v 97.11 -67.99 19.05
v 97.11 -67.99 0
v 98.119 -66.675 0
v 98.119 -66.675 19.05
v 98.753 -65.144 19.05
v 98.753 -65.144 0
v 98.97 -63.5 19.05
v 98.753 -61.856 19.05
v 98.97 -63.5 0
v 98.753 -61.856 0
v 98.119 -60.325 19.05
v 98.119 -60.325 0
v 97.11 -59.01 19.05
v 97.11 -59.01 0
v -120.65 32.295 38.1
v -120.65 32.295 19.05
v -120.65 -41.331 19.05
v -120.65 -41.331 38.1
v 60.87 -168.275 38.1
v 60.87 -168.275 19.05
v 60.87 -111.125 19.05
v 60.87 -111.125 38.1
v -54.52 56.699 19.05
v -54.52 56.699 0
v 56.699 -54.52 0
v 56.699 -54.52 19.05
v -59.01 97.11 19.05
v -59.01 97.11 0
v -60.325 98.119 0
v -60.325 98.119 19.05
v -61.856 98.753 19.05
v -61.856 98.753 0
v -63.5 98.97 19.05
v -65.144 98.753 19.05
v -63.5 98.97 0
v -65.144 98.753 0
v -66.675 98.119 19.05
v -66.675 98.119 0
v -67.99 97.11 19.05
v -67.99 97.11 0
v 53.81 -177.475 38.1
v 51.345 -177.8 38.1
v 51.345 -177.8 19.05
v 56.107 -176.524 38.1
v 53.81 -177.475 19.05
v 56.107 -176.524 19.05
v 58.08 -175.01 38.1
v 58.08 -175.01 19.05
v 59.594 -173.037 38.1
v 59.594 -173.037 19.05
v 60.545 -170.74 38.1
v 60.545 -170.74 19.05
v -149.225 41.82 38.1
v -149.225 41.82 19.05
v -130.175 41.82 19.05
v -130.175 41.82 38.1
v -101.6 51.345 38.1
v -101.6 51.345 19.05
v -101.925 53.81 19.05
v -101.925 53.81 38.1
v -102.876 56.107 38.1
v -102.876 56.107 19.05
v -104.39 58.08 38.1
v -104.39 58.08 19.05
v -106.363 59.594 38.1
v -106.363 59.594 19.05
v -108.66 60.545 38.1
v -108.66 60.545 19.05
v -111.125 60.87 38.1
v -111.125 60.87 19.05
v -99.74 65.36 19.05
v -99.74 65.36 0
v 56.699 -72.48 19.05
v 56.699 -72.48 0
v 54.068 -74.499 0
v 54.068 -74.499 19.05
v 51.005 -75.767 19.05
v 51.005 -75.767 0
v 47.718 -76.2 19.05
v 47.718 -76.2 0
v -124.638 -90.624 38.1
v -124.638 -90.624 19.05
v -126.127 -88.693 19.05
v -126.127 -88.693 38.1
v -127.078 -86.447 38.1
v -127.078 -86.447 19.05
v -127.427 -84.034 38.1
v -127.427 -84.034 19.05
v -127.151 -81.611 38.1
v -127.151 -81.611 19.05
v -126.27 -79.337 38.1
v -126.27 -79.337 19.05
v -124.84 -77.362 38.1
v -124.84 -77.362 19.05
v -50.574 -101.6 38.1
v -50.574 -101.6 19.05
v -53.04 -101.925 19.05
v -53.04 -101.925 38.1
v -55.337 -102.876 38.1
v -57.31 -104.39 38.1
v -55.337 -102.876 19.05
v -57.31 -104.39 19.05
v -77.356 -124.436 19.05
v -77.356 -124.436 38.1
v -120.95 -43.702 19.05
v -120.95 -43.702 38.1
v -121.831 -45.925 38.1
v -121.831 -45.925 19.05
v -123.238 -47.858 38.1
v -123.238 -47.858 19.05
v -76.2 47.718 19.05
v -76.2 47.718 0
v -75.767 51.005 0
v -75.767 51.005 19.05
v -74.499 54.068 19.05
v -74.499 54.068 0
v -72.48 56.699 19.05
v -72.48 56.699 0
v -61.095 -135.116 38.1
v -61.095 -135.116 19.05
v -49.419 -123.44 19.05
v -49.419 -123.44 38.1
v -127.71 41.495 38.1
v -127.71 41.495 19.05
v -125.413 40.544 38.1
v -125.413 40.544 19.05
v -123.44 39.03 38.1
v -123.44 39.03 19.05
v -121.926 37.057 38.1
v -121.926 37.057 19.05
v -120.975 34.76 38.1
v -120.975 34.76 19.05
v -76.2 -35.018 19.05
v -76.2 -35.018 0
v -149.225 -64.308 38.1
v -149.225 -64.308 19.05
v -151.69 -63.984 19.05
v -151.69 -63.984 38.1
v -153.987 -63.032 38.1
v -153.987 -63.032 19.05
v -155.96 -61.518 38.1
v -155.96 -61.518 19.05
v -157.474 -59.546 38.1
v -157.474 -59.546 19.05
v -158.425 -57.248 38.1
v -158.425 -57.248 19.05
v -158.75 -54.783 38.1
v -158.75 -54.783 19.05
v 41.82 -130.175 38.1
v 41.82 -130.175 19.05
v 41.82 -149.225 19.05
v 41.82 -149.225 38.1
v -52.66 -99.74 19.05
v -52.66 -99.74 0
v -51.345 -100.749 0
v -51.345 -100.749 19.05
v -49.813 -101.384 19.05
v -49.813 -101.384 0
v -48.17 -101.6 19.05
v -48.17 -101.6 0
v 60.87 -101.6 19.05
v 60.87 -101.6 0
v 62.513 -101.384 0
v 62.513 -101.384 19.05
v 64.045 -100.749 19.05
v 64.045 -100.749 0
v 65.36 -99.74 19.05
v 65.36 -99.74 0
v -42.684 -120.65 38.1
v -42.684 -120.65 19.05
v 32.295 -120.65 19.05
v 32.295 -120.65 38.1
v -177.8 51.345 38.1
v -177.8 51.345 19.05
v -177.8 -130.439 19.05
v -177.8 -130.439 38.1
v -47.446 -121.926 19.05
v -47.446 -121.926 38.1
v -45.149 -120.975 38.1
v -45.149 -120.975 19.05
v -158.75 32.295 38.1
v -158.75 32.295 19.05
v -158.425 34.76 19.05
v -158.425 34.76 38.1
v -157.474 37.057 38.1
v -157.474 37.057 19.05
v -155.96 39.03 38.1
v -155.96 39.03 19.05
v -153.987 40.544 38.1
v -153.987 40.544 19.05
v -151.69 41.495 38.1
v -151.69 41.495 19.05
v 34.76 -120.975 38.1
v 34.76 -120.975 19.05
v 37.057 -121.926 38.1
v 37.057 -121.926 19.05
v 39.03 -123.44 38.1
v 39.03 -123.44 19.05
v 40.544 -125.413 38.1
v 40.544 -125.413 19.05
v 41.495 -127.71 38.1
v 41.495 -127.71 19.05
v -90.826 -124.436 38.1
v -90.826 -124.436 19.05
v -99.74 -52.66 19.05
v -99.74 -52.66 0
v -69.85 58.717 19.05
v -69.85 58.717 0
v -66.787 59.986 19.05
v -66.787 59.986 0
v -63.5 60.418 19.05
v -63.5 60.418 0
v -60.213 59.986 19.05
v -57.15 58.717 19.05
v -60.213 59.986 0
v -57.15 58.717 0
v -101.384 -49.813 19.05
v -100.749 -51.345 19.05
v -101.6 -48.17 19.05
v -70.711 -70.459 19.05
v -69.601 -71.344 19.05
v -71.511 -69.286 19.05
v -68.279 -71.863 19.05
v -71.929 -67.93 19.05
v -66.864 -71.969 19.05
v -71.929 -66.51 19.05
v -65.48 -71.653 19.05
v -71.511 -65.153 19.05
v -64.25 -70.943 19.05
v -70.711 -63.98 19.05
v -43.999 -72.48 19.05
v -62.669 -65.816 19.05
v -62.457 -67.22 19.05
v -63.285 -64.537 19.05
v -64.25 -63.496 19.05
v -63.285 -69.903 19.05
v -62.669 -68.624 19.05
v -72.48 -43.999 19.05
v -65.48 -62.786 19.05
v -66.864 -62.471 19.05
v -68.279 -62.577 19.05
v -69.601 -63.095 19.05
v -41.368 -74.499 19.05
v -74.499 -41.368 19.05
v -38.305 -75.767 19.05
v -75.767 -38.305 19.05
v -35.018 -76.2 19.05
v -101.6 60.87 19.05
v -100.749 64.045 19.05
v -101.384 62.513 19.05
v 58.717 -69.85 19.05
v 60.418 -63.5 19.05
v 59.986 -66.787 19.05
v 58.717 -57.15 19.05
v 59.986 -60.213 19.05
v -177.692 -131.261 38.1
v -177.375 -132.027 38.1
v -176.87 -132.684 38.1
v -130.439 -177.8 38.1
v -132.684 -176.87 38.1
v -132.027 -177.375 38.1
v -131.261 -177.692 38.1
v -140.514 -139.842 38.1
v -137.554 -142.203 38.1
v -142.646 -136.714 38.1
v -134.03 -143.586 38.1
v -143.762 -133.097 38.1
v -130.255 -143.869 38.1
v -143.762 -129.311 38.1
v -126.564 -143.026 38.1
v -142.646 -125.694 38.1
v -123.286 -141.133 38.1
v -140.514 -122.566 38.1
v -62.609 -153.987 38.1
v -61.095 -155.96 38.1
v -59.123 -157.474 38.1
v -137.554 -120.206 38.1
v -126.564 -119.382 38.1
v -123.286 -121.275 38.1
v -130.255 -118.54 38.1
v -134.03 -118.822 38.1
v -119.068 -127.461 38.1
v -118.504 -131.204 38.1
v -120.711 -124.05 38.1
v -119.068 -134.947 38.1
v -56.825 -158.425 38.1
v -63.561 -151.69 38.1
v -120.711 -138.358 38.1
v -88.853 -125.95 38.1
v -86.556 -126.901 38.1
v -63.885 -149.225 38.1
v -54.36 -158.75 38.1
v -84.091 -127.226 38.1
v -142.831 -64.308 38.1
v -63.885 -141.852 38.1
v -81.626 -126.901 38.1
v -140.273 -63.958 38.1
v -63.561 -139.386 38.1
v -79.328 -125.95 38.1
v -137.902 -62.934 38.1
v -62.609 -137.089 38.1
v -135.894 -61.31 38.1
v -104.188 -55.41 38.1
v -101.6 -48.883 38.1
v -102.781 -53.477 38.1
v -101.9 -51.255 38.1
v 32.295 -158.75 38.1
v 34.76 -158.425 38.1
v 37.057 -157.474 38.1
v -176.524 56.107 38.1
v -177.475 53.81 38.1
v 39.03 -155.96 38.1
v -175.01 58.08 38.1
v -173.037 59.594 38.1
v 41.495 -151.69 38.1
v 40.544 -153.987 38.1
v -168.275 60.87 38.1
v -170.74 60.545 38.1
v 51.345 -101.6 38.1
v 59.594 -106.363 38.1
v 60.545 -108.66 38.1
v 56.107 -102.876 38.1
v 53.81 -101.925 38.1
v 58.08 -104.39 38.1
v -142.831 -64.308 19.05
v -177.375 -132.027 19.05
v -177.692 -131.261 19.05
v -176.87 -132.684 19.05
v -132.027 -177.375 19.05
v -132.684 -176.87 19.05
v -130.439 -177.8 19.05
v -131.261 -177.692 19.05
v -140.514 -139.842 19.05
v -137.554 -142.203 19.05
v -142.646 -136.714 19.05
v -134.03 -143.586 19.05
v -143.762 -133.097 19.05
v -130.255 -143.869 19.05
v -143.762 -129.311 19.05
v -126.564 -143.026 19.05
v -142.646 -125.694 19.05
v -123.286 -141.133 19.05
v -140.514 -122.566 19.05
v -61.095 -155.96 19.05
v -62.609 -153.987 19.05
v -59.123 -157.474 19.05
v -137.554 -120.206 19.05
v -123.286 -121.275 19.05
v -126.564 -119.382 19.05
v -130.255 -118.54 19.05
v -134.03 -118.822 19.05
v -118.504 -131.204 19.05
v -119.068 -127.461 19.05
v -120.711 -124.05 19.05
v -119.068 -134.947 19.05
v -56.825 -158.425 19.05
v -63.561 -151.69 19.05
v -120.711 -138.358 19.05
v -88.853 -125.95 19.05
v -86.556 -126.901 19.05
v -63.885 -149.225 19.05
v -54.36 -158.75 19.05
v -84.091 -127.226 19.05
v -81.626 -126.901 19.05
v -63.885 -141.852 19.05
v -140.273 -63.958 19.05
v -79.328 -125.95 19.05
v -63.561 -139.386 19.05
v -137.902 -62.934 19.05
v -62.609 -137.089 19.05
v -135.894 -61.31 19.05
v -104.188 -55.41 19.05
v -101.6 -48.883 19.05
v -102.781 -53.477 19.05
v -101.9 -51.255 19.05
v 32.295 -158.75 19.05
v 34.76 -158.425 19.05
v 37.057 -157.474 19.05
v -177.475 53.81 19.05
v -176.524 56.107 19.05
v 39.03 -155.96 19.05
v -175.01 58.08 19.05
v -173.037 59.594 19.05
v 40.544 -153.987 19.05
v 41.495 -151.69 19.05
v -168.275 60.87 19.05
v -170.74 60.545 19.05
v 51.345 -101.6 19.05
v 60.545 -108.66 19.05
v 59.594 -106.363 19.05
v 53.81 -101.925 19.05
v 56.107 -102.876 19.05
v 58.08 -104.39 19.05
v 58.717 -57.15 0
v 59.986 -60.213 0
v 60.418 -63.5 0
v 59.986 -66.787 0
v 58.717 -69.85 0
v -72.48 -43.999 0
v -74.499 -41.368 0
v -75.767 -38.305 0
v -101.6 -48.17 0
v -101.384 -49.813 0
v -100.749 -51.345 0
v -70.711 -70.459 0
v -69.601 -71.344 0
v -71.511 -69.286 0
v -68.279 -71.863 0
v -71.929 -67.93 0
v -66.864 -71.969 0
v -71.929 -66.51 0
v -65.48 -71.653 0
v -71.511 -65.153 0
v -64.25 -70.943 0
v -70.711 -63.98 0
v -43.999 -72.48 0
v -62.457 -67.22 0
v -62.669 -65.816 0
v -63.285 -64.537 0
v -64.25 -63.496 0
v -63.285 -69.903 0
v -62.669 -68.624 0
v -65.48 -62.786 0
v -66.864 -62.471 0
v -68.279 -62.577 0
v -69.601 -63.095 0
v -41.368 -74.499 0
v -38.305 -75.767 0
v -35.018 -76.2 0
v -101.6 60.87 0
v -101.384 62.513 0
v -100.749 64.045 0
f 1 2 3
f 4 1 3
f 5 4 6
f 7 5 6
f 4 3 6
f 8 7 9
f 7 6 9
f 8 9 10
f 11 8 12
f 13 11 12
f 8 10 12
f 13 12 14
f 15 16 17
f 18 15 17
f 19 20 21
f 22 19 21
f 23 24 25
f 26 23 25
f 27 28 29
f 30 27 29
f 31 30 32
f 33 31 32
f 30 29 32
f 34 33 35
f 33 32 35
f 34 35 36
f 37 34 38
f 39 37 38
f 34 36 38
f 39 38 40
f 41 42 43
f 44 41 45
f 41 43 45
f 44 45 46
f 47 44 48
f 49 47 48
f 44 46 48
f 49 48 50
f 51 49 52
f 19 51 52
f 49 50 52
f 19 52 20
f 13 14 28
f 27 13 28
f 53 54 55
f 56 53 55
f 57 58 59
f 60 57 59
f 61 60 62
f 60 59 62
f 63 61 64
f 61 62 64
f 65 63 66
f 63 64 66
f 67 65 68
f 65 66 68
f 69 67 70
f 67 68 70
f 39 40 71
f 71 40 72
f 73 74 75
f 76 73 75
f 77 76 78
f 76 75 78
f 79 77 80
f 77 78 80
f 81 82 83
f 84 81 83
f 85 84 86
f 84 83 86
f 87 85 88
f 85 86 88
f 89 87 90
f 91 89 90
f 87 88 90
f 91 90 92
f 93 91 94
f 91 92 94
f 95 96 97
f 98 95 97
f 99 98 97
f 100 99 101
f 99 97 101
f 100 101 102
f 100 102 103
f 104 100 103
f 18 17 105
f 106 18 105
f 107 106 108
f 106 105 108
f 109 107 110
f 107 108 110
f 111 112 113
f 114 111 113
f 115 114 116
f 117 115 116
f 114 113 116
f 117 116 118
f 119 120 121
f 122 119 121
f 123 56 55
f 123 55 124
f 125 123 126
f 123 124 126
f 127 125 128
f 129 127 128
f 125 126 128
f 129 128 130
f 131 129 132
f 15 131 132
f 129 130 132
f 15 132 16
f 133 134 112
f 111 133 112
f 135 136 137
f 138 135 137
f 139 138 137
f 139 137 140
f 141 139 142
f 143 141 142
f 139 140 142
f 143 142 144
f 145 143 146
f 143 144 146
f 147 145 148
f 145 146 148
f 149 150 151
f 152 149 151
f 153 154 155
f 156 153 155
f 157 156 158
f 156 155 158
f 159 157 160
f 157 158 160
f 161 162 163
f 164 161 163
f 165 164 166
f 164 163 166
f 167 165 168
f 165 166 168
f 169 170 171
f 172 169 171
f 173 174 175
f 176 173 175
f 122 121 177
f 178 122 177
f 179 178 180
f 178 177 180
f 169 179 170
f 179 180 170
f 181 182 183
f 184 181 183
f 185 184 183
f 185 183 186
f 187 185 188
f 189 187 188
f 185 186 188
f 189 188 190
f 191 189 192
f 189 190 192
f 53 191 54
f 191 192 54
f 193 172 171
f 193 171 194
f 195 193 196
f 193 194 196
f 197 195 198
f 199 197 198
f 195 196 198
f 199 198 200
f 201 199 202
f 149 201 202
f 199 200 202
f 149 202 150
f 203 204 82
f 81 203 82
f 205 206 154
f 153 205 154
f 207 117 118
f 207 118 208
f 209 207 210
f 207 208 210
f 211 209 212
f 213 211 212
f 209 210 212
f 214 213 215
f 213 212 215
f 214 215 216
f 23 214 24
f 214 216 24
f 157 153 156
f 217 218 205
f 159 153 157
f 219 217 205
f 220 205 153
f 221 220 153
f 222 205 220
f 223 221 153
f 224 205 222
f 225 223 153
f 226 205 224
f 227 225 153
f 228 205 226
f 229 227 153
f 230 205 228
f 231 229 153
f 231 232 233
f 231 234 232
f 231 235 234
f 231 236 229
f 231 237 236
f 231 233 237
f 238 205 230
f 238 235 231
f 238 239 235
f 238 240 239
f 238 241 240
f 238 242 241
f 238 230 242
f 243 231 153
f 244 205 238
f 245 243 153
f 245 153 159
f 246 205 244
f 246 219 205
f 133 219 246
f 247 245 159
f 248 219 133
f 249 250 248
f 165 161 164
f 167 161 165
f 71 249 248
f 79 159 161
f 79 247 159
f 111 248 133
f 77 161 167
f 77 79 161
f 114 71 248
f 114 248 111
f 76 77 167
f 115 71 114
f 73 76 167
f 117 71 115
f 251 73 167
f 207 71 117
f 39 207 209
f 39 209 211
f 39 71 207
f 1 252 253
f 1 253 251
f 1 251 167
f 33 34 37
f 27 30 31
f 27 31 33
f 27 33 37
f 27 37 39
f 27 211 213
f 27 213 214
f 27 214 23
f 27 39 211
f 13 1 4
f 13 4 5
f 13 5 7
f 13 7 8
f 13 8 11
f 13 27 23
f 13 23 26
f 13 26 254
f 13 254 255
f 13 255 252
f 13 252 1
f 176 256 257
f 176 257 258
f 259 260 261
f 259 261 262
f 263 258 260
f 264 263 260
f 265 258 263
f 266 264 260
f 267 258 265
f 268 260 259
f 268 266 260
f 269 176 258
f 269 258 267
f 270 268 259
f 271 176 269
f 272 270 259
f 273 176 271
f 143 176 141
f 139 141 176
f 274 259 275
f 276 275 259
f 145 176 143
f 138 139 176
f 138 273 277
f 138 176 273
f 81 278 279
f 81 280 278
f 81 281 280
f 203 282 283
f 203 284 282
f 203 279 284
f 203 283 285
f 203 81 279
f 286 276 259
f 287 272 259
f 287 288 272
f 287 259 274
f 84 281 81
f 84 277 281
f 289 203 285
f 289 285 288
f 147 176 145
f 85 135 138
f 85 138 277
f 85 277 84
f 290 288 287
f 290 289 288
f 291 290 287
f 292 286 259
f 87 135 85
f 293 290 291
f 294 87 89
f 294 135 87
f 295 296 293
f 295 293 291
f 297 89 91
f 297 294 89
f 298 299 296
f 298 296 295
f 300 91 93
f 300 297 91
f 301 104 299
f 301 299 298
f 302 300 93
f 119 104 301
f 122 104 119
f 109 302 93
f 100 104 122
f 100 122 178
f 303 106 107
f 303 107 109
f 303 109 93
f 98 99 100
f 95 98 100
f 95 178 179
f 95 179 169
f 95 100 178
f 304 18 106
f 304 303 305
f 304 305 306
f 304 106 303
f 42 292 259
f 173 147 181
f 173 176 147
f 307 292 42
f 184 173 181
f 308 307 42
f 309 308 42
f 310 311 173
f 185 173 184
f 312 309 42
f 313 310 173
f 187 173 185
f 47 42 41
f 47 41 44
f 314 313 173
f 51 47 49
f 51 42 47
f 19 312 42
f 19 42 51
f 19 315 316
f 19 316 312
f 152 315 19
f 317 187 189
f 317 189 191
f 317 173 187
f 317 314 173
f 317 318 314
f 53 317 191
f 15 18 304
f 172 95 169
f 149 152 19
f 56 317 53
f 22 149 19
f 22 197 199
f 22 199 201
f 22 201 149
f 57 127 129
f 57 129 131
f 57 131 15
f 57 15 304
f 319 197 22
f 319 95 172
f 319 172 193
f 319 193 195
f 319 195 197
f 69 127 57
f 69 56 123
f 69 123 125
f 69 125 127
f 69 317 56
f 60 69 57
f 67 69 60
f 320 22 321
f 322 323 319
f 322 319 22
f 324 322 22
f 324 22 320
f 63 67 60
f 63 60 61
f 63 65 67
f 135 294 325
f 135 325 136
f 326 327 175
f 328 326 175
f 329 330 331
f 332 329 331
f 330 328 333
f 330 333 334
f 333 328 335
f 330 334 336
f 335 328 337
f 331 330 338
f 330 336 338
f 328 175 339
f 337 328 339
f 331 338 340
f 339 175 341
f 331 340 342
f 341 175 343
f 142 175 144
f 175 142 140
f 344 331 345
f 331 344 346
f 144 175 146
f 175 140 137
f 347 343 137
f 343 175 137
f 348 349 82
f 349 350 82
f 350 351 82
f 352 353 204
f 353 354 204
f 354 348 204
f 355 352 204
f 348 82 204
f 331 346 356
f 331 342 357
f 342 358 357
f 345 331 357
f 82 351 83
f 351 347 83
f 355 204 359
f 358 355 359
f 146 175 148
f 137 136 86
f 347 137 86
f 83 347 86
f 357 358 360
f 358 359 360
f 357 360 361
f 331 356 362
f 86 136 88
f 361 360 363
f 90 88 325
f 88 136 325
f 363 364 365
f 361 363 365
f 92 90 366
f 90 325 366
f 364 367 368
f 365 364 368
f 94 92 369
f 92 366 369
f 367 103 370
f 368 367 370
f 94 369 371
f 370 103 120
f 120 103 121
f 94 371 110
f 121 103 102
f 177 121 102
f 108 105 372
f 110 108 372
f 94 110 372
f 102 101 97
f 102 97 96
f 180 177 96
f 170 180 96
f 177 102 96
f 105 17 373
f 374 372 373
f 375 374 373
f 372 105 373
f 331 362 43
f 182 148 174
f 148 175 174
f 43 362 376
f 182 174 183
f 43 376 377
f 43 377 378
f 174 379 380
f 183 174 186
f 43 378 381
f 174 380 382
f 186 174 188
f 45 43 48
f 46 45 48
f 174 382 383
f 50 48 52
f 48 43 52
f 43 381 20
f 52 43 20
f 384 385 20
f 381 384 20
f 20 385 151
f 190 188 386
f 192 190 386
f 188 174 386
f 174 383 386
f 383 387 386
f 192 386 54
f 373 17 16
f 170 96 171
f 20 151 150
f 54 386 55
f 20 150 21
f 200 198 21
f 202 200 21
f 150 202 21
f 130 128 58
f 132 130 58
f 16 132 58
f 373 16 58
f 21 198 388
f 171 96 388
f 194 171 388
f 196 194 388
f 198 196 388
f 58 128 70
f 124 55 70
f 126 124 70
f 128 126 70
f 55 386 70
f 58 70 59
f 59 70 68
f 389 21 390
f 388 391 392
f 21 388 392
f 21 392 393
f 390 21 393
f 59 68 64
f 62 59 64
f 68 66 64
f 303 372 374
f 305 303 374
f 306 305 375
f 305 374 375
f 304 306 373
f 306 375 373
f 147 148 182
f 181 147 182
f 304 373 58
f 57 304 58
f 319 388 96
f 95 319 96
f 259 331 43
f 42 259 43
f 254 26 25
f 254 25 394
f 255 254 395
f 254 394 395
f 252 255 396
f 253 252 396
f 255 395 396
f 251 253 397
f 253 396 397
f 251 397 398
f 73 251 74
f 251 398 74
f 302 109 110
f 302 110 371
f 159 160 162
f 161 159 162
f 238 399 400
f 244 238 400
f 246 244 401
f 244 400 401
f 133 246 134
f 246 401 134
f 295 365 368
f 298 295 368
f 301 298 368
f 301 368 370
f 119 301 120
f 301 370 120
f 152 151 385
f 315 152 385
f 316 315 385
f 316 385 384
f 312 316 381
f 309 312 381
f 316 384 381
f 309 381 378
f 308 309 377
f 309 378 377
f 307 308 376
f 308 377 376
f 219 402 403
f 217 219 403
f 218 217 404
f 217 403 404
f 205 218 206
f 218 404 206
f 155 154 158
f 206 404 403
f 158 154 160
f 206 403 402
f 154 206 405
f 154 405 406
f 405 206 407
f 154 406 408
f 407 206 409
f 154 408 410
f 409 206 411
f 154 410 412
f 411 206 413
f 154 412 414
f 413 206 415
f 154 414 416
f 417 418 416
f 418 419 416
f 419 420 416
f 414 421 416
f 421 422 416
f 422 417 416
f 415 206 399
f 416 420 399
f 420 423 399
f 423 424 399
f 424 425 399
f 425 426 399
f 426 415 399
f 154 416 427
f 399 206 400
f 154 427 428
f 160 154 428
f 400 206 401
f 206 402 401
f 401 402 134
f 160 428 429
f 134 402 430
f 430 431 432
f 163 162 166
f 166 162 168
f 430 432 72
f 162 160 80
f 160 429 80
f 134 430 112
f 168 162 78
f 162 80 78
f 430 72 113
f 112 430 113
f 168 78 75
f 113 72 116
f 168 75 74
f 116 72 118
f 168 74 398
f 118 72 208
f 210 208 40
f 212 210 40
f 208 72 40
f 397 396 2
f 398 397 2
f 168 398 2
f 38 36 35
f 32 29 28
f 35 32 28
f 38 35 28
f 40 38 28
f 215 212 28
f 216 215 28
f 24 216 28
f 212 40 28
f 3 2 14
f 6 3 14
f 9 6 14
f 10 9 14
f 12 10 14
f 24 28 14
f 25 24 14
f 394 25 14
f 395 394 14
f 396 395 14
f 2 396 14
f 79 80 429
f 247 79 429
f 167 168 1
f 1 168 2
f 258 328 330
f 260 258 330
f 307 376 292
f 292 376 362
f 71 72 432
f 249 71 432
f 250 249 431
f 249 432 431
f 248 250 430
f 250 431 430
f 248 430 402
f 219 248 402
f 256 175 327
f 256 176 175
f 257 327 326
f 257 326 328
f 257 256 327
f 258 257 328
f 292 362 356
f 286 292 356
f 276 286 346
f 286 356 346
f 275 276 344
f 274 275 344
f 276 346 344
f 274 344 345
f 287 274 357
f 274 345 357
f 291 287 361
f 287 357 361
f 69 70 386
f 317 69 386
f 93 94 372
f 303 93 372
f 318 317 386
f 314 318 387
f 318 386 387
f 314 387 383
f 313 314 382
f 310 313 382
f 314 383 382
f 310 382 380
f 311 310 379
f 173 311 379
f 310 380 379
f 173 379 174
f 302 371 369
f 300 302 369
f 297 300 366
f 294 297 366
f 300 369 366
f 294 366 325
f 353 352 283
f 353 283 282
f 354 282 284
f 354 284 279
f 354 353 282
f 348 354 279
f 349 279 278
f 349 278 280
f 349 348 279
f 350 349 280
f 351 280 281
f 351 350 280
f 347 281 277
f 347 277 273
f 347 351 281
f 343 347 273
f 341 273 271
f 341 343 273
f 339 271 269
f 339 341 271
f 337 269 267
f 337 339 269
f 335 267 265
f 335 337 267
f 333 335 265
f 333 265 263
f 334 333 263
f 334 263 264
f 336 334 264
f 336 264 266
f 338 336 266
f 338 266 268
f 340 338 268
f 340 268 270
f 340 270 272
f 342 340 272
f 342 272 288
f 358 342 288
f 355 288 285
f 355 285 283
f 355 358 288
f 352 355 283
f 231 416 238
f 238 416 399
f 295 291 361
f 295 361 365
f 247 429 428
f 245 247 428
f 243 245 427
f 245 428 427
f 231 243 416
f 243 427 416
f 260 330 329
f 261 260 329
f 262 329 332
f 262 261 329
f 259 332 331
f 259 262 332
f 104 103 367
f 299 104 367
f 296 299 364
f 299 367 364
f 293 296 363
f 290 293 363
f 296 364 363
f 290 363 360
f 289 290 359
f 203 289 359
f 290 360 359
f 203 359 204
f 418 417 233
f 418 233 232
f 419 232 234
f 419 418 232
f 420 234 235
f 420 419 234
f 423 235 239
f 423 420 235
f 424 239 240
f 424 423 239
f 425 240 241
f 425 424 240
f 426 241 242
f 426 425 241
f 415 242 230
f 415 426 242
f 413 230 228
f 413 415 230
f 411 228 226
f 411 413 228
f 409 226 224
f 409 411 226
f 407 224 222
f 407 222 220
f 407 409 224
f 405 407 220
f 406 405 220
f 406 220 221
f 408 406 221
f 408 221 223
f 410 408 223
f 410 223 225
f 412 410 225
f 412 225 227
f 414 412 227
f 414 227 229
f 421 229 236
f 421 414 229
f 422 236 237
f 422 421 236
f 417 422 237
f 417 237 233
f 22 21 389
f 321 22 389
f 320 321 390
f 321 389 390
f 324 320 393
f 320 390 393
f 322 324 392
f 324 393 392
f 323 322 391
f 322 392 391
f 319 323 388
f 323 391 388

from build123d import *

# Parameters (mm, degrees)
F0_R     = 4.7625
F1_DEPTH = 19.05
F2_R     = 12.7
F3_DEPTH = 19.05
F4_R     = 3.175


with BuildPart() as f1:
    # F0 (on Top) → F1 (new body)
    with BuildSketch(Plane.XY):
        with BuildLine():
            ThreePointArc((-52.659872, -99.740128), (-50.599784, -101.116635), (-48.169744, -101.6))
            Line((-48.169744, -101.6), (60.869744, -101.6))
            ThreePointArc((60.869744, -101.6), (63.299784, -101.116635), (65.359872, -99.740128))
            Line((65.359872, -99.740128), (97.109872, -67.990128))
            ThreePointArc((97.109872, -67.990128), (98.969744, -63.5), (97.109872, -59.009872))
            Line((97.109872, -59.009872), (-59.009872, 97.109872))
            ThreePointArc((-59.009872, 97.109872), (-63.5, 98.969744), (-67.990128, 97.109872))
            Line((-67.990128, 97.109872), (-99.740128, 65.359872))
            ThreePointArc((-99.740128, 65.359872), (-101.116635, 63.299784), (-101.6, 60.869744))
            Line((-101.6, 60.869744), (-101.6, -48.169744))
            ThreePointArc((-101.6, -48.169744), (-101.116635, -50.599784), (-99.740128, -52.659872))
            Line((-99.740128, -52.659872), (-52.659872, -99.740128))
        make_face()
        with Locations((-67.219744, -67.219744)):
            Circle(F0_R, mode=Mode.SUBTRACT)
        with BuildLine():
            Line((-43.998719, -72.480256), (-72.480256, -43.998719))
            ThreePointArc((-72.480256, -43.998719), (-75.23327, -39.878543), (-76.2, -35.018463))
            Line((-76.2, -35.018463), (-76.2, 47.718463))
            ThreePointArc((-76.2, 47.718463), (-75.23327, 52.578543), (-72.480256, 56.698719))
            ThreePointArc((-72.480256, 56.698719), (-63.5, 60.418463), (-54.519744, 56.698719))
            Line((-54.519744, 56.698719), (56.698719, -54.519744))
            ThreePointArc((56.698719, -54.519744), (60.418463, -63.5), (56.698719, -72.480256))
            ThreePointArc((56.698719, -72.480256), (52.578543, -75.23327), (47.718463, -76.2))
            Line((47.718463, -76.2), (-35.018463, -76.2))
            ThreePointArc((-35.018463, -76.2), (-39.878543, -75.23327), (-43.998719, -72.480256))
        make_face(mode=Mode.SUBTRACT)
    extrude(amount=F1_DEPTH)


with BuildPart() as f3:
    # F2 (on face) → F3 (new body)
    with BuildSketch(Plane.XY.offset(19.05)):
        with BuildLine():
            Line((-101.6, -48.169744), (-101.6, 51.344744))
            ThreePointArc((-101.6, 51.344744), (-104.389808, 58.079936), (-111.125, 60.869744))
            Line((-111.125, 60.869744), (-168.275, 60.869744))
            ThreePointArc((-168.275, 60.869744), (-175.010192, 58.079936), (-177.8, 51.344744))
            Line((-177.8, 51.344744), (-177.8, -131.754482))
            Line((-177.8, -131.754482), (-131.754482, -177.8))
            Line((-131.754482, -177.8), (51.344744, -177.8))
            ThreePointArc((51.344744, -177.8), (58.079936, -175.010192), (60.869744, -168.275))
            Line((60.869744, -168.275), (60.869744, -111.125))
            ThreePointArc((60.869744, -111.125), (58.079936, -104.389808), (51.344744, -101.6))
            Line((51.344744, -101.6), (-48.169744, -101.6))
            Line((-48.169744, -101.6), (-50.57436, -101.6))
            ThreePointArc((-50.57436, -101.6), (-54.219419, -102.325047), (-57.309552, -104.389808))
            Line((-57.309552, -104.389808), (-77.355576, -124.435832))
            ThreePointArc((-77.355576, -124.435832), (-84.090768, -127.22564), (-90.82596, -124.435832))
            Line((-90.82596, -124.435832), (-124.63805, -90.623743))
            ThreePointArc((-124.63805, -90.623743), (-127.426752, -84.033703), (-124.840174, -77.361739))
            Line((-124.840174, -77.361739), (-104.187684, -55.410308))
            ThreePointArc((-104.187684, -55.410308), (-102.270522, -52.39403), (-101.6, -48.883497))
            Line((-101.6, -48.883497), (-101.6, -48.169744))
        make_face()
        with Locations((-131.204069, -131.204069)):
            Circle(F2_R, mode=Mode.SUBTRACT)
        with BuildLine():
            ThreePointArc((-63.885192, -141.851601), (-63.160145, -138.206541), (-61.095384, -135.116409))
            Line((-61.095384, -135.116409), (-49.418783, -123.439808))
            ThreePointArc((-49.418783, -123.439808), (-46.328651, -121.375047), (-42.683591, -120.65))
            Line((-42.683591, -120.65), (32.294744, -120.65))
            ThreePointArc((32.294744, -120.65), (39.029936, -123.439808), (41.819744, -130.175))
            Line((41.819744, -130.175), (41.819744, -149.225))
            ThreePointArc((41.819744, -149.225), (39.029936, -155.960192), (32.294744, -158.75))
            Line((32.294744, -158.75), (-54.360192, -158.75))
            ThreePointArc((-54.360192, -158.75), (-61.095384, -155.960192), (-63.885192, -149.225))
            Line((-63.885192, -149.225), (-63.885192, -141.851601))
        make_face(mode=Mode.SUBTRACT)
        with BuildLine():
            Line((-158.75, -54.783115), (-158.75, 32.294744))
            ThreePointArc((-158.75, 32.294744), (-155.960192, 39.029936), (-149.225, 41.819744))
            Line((-149.225, 41.819744), (-130.175, 41.819744))
            ThreePointArc((-130.175, 41.819744), (-123.439808, 39.029936), (-120.65, 32.294744))
            Line((-120.65, 32.294744), (-120.65, -41.330746))
            ThreePointArc((-120.65, -41.330746), (-121.320522, -44.84128), (-123.237684, -47.857558))
            Line((-123.237684, -47.857558), (-135.894031, -61.309927))
            ThreePointArc((-135.894031, -61.309927), (-139.052608, -63.526499), (-142.831347, -64.308115))
            Line((-142.831347, -64.308115), (-149.225, -64.308115))
            ThreePointArc((-149.225, -64.308115), (-155.960192, -61.518307), (-158.75, -54.783115))
        make_face(mode=Mode.SUBTRACT)
    extrude(amount=F3_DEPTH)

    # F4
    f4_edges = [f3.edges().sort_by_distance(p)[0] for p in [
        (-131.754482, -177.8, 28.575),
        (-177.8, -131.754482, 28.575),
    ]]
    fillet(f4_edges, radius=F4_R)


solid = Compound([f1.part, f3.part])
